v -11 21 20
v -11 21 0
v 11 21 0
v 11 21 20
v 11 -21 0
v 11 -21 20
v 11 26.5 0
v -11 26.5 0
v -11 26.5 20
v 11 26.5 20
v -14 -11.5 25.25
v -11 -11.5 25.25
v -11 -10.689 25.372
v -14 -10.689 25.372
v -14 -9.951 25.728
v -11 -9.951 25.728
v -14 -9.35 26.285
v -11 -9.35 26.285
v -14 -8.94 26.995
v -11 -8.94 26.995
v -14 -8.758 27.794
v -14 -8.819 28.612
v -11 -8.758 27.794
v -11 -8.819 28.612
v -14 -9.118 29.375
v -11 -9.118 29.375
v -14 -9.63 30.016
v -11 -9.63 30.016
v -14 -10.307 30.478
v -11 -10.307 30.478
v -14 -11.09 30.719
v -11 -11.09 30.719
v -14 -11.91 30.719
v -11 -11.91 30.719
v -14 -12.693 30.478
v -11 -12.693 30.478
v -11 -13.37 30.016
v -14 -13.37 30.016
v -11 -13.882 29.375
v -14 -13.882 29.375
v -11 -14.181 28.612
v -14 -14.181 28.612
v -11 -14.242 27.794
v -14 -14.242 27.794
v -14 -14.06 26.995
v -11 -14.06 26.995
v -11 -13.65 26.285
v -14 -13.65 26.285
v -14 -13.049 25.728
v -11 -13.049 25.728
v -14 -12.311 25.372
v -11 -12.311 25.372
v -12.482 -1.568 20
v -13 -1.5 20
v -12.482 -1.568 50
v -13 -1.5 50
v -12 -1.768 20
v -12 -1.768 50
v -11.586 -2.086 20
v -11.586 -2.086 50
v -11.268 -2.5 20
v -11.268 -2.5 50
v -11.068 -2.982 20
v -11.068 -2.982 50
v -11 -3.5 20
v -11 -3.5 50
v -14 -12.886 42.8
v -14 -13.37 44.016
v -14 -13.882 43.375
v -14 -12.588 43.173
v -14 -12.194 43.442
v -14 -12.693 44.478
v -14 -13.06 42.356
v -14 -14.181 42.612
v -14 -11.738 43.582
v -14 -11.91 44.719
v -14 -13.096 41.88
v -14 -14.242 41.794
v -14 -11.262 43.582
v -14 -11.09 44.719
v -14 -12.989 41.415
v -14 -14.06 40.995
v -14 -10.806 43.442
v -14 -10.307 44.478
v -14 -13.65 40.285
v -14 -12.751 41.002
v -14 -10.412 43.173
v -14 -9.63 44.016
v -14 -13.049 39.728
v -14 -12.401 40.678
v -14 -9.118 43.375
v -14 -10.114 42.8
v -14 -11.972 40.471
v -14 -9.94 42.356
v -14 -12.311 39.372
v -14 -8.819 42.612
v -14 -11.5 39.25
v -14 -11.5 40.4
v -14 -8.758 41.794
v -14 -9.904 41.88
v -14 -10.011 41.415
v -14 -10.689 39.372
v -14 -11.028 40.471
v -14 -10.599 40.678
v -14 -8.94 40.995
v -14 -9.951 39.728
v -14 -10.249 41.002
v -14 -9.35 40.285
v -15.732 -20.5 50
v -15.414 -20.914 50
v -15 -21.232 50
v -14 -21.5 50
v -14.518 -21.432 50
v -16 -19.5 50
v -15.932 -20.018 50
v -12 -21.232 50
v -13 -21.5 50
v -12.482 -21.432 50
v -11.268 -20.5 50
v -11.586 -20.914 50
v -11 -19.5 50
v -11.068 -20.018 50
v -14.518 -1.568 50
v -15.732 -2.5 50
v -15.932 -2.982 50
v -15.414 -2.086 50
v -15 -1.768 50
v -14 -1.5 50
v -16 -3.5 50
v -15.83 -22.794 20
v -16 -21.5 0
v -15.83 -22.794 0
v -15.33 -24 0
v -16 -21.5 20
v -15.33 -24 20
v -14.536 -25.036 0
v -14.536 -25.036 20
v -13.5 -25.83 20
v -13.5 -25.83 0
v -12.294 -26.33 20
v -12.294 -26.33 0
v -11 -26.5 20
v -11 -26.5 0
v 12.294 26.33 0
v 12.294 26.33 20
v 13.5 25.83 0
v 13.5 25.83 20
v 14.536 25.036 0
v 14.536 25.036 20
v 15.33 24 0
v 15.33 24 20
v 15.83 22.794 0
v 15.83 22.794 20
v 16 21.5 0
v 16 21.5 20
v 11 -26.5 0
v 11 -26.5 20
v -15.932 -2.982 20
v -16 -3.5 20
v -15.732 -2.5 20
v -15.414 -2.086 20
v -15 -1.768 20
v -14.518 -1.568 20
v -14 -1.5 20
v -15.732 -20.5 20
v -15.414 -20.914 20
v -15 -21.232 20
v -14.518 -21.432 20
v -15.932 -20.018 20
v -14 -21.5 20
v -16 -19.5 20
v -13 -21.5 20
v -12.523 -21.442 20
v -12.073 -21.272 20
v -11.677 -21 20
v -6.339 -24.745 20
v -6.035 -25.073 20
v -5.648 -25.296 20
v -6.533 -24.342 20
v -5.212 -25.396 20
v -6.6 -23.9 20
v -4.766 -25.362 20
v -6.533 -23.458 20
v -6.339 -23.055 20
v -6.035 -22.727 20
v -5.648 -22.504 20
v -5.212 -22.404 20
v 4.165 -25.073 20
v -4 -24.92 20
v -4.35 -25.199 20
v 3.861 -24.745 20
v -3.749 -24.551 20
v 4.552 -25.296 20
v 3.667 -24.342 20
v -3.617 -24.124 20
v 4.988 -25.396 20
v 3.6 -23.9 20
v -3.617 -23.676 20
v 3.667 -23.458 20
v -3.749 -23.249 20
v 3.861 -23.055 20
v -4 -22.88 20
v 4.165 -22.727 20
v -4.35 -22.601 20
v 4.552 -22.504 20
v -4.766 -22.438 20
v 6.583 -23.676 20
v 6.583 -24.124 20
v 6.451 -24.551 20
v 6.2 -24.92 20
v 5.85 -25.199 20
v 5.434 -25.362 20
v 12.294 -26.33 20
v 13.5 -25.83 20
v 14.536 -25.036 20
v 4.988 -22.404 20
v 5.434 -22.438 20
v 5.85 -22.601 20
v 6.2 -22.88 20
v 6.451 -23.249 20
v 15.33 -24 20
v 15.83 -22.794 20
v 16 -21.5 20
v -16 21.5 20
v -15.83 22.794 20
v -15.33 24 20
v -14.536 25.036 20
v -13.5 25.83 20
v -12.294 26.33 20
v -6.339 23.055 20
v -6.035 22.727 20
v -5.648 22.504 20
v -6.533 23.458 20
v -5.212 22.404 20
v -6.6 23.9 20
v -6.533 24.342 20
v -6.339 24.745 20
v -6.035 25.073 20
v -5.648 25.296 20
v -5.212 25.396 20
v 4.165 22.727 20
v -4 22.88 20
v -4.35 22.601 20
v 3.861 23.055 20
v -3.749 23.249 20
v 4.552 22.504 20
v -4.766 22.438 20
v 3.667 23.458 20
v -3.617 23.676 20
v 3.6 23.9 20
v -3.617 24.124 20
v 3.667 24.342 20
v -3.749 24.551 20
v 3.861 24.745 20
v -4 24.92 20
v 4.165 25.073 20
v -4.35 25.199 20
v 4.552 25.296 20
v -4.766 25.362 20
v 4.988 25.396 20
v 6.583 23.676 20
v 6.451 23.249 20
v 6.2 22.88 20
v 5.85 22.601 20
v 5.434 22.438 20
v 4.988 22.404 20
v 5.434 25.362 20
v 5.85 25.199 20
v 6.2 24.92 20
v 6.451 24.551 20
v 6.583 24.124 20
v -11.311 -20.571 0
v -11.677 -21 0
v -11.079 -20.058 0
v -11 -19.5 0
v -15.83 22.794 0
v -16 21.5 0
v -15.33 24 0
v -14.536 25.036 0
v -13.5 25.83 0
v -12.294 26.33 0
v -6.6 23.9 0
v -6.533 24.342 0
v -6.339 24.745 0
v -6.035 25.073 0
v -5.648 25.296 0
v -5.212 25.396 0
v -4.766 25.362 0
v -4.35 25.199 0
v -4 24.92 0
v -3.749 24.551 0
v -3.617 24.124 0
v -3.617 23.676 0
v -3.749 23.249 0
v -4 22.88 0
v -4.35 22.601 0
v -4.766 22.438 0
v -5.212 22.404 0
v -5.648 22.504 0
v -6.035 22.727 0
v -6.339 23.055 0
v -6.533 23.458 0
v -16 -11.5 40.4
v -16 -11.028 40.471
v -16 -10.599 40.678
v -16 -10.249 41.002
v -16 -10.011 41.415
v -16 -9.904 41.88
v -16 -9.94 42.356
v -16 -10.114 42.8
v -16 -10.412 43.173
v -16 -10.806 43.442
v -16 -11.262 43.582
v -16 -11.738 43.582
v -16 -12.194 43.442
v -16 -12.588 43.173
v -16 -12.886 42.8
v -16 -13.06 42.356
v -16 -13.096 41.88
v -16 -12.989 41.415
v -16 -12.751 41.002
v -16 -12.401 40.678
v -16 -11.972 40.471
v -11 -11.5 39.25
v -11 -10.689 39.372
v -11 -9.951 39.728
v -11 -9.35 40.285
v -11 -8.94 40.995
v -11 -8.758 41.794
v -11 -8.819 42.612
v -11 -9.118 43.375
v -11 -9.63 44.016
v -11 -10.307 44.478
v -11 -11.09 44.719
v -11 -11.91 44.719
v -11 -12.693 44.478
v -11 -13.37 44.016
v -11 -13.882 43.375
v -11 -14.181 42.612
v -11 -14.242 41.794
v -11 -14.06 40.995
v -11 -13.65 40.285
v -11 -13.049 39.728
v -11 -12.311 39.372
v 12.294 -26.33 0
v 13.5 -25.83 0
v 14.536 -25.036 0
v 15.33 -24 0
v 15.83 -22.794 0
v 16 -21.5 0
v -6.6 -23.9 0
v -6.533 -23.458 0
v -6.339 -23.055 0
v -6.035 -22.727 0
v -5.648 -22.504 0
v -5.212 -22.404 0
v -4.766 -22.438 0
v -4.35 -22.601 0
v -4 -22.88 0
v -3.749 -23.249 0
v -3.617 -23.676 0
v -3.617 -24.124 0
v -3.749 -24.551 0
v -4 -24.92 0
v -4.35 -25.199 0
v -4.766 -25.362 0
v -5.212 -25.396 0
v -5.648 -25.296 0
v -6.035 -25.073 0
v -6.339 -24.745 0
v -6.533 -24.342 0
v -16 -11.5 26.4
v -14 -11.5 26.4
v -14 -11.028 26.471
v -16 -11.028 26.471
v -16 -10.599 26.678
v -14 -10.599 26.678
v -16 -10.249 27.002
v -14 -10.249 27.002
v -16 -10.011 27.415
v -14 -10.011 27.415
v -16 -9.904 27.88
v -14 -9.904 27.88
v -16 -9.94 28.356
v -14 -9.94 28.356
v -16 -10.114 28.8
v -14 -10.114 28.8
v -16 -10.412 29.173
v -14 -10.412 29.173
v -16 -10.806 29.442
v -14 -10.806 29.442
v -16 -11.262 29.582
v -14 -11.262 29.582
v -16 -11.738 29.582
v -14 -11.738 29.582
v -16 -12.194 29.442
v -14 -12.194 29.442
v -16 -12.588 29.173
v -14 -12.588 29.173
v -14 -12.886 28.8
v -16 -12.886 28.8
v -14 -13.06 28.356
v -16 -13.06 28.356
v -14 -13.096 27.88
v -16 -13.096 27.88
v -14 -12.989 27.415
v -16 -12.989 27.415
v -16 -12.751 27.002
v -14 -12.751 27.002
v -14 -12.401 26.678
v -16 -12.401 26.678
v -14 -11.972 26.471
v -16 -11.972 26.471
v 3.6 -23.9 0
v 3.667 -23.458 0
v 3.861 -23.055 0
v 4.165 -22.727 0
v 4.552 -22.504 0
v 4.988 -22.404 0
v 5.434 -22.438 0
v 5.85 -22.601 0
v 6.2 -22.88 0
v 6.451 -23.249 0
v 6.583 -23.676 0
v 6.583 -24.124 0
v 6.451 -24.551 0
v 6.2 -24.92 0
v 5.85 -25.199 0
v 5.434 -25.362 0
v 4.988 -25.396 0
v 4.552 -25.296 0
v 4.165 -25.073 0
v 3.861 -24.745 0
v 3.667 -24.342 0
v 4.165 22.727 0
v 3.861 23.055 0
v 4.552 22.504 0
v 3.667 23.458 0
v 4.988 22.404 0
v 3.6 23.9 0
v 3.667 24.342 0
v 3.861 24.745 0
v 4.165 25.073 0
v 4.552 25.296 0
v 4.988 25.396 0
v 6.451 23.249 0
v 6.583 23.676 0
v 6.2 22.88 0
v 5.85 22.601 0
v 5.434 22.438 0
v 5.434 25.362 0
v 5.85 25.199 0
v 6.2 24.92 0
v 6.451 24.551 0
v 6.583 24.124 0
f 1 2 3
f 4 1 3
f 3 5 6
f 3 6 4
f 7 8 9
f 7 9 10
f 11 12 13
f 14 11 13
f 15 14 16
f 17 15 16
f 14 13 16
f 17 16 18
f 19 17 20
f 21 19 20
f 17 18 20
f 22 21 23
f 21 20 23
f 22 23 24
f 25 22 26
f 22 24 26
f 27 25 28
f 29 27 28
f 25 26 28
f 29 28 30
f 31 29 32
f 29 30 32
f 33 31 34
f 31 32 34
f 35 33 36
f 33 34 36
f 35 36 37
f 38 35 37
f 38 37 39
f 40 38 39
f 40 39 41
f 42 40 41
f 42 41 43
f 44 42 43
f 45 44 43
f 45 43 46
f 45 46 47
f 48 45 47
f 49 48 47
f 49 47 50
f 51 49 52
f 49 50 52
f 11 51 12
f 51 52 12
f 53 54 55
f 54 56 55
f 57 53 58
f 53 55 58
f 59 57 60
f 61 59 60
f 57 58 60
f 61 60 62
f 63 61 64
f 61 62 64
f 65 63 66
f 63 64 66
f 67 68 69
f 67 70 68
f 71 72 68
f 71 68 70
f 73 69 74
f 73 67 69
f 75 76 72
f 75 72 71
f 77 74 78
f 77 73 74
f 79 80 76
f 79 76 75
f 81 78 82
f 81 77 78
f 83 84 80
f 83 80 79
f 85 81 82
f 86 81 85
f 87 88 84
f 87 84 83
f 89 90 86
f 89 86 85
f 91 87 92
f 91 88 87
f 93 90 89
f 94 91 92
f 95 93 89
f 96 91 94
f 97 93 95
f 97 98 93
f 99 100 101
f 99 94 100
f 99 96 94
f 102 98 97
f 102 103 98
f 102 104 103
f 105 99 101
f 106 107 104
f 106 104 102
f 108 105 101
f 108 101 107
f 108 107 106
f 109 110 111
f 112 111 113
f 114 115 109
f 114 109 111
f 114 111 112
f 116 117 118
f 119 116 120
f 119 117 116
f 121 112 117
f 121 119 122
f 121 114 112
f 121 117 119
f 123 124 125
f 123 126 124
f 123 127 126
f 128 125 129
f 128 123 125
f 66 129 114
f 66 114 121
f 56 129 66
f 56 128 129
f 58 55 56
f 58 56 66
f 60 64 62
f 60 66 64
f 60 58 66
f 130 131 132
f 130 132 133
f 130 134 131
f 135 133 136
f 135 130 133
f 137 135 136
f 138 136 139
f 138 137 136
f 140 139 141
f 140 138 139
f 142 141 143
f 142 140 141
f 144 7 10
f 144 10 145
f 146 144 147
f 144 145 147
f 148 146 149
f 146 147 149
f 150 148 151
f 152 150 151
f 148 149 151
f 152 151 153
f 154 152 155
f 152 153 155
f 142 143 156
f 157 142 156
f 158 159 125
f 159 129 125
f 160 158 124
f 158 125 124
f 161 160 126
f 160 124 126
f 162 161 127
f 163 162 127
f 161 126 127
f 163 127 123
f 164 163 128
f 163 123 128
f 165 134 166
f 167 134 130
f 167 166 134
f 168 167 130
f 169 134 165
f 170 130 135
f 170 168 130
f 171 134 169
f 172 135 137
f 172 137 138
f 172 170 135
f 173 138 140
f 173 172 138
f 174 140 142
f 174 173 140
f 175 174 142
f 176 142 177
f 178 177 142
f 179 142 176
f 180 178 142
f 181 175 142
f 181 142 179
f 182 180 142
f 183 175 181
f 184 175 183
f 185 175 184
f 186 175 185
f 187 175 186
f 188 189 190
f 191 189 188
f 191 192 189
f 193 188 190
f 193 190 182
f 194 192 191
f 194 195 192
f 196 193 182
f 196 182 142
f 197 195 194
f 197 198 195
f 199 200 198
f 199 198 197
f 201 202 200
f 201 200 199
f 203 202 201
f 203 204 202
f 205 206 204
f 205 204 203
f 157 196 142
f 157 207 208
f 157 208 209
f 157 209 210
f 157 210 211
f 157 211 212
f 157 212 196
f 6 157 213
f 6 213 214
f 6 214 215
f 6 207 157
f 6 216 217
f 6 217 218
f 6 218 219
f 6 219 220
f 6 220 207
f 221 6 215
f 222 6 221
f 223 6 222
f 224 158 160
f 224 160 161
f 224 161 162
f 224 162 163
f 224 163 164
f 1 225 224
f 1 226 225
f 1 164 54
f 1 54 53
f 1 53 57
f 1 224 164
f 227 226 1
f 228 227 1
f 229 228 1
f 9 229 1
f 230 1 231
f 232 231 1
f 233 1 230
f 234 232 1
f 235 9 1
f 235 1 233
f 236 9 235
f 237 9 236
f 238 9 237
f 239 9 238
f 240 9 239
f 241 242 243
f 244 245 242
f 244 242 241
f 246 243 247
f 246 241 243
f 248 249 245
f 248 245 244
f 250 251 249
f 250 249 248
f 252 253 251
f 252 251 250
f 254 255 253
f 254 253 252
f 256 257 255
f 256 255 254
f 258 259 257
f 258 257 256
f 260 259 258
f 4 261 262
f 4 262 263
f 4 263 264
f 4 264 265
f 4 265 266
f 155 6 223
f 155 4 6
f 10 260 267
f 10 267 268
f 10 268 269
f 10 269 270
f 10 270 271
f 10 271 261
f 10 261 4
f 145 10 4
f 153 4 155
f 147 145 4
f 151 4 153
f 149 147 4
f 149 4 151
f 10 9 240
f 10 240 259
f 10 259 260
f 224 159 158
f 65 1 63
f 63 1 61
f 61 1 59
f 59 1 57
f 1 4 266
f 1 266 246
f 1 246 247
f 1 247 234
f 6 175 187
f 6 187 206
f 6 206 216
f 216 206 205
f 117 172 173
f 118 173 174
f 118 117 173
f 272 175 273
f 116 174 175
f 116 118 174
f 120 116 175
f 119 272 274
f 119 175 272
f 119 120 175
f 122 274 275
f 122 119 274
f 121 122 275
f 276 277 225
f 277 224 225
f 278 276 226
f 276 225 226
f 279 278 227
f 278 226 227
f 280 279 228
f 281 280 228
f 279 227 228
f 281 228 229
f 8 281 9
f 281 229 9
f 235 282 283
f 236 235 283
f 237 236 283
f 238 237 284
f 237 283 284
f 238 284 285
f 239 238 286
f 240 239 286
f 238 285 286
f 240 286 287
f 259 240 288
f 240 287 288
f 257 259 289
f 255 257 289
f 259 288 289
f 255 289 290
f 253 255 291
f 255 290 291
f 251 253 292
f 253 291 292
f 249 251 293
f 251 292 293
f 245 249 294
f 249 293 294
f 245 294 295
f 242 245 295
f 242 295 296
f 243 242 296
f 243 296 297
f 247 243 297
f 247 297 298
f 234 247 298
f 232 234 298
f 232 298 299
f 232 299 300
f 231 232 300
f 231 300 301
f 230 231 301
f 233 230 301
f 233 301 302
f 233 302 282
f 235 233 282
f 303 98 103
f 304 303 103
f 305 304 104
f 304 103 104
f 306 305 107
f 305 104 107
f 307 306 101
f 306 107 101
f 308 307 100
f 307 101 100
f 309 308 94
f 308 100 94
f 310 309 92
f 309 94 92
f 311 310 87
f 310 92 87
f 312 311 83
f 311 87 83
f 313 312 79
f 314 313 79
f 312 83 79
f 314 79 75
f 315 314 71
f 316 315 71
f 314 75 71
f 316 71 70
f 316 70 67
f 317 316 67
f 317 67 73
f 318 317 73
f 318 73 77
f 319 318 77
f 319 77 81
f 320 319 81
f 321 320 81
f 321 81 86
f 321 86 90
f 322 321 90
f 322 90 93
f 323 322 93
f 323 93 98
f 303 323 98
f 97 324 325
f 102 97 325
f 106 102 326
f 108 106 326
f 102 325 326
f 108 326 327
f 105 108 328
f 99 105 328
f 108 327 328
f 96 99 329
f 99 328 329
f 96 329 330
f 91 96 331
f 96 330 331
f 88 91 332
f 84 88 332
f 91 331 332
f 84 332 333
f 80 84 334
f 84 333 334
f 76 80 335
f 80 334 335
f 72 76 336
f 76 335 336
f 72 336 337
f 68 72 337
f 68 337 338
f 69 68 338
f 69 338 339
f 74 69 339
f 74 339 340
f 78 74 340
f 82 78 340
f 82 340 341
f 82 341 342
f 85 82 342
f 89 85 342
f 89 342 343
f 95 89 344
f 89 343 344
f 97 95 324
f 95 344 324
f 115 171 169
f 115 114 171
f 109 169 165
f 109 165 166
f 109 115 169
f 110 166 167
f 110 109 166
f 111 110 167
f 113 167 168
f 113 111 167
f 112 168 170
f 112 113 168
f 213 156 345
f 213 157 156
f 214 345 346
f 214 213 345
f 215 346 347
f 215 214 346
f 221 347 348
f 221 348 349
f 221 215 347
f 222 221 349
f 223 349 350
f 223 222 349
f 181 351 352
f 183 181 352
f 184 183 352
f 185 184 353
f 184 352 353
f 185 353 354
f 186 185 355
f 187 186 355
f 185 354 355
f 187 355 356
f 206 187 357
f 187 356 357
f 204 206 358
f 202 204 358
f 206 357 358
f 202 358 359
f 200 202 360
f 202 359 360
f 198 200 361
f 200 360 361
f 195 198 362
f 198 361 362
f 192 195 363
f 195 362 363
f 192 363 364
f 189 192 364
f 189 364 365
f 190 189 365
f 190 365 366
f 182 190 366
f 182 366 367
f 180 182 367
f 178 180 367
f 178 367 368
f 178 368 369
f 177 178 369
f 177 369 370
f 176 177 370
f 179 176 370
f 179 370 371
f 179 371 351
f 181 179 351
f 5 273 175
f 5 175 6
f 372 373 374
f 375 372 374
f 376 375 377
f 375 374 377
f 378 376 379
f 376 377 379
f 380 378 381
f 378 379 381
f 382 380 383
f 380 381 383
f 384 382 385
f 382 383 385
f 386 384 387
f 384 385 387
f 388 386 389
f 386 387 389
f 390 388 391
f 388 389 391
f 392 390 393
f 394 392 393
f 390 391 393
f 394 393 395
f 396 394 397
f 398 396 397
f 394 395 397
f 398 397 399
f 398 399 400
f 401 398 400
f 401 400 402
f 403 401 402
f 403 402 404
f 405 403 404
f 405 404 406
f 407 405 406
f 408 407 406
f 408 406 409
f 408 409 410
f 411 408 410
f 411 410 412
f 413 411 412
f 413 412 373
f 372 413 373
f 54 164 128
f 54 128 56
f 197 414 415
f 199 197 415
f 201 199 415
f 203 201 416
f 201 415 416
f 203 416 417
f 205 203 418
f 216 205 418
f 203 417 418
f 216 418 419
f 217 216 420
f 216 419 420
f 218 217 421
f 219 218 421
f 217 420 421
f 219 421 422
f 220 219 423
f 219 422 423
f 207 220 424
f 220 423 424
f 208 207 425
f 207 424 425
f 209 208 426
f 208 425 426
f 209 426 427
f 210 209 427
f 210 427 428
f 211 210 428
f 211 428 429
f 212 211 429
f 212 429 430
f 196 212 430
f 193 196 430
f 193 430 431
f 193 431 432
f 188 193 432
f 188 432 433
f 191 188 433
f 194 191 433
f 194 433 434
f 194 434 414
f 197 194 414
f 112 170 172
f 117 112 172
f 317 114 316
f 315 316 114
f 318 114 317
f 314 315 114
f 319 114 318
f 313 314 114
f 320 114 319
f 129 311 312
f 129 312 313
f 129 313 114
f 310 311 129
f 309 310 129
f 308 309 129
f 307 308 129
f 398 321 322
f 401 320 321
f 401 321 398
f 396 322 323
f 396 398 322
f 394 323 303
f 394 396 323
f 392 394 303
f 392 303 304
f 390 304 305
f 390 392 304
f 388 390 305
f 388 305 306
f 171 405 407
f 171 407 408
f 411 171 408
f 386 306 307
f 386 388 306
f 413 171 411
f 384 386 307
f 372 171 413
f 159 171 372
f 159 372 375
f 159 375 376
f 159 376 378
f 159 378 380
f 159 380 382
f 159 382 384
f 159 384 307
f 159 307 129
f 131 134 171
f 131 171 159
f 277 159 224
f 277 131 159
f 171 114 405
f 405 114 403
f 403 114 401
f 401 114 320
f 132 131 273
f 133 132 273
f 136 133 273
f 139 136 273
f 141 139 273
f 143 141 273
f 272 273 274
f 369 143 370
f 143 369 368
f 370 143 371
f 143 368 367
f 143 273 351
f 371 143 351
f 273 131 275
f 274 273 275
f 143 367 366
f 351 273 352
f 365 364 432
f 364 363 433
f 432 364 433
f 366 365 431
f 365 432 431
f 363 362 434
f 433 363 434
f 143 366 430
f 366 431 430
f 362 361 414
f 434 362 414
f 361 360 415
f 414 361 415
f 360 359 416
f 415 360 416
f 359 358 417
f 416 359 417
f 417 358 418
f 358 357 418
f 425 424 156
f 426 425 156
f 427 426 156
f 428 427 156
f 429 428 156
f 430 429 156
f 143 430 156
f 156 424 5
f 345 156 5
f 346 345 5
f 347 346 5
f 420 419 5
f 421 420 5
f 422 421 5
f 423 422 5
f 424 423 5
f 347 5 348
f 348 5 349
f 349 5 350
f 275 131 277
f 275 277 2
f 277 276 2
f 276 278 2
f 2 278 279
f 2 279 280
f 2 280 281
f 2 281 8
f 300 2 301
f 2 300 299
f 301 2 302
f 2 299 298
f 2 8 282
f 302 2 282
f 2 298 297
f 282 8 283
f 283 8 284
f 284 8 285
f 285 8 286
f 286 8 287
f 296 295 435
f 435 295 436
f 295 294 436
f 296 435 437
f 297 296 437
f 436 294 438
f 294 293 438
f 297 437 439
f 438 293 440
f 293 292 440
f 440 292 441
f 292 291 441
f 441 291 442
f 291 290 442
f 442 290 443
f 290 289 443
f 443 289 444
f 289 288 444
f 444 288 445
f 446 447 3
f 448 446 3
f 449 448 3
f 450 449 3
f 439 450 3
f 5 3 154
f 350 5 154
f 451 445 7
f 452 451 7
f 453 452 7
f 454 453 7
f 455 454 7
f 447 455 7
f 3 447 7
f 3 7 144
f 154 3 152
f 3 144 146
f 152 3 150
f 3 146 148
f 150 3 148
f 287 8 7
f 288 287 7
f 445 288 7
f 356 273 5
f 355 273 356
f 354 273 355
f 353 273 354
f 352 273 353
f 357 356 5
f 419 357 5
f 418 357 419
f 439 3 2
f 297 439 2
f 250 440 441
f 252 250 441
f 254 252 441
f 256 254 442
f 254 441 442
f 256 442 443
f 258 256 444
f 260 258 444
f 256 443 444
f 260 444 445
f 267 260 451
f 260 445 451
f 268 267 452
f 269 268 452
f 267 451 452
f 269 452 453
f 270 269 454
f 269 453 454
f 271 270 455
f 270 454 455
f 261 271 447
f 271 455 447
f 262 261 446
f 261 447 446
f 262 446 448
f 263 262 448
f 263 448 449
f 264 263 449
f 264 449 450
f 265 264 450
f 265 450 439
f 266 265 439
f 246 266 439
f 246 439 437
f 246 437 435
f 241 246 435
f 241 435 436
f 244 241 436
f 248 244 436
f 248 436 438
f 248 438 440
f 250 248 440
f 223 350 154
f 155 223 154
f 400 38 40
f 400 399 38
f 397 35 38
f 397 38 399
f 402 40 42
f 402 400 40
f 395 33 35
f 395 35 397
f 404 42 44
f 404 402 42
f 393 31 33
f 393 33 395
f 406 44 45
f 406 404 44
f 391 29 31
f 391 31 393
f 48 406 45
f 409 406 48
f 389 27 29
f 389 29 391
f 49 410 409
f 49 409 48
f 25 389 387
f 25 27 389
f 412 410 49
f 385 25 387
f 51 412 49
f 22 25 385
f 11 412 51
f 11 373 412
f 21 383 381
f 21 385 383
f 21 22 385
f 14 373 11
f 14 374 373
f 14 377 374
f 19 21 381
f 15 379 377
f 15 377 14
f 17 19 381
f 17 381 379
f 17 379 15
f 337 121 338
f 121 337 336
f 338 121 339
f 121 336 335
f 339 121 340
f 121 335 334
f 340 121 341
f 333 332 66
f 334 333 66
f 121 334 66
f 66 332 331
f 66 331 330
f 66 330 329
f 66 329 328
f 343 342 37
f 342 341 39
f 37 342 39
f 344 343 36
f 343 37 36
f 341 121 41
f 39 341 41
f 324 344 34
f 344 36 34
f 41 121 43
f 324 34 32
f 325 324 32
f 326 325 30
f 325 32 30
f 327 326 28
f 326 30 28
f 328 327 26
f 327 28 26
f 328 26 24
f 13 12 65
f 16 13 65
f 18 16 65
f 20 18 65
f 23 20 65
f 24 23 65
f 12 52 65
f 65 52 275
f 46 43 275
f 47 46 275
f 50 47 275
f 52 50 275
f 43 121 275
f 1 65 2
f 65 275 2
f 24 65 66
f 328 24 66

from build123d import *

# Parameters (mm, degrees)
SKETCH1_W           = 32
SKETCH1_H           = 53
SKETCH1_W_2         = 22
SKETCH1_H_2         = 42
BOSS_EXTRUDE1_DEPTH = 20
SKETCH2_W           = 5
SKETCH2_H           = 20
BOSS_EXTRUDE2_DEPTH = 30
SKETCH3_R           = 2.75
SKETCH3_R_2         = 1.6
CUT_EXTRUDE1_DEPTH  = 3
SKETCH3_2_R         = 1.6
CUT_EXTRUDE2_DEPTH  = 63.69968102
SKETCH4_R           = 1.5
CUT_EXTRUDE3_DEPTH  = 59.806887352
FILLET1_R           = 5
FILLET2_R           = 2


with BuildPart() as part:
    # Sketch1 → Boss-Extrude1 (new body)
    with BuildSketch(Plane.XY):
        Rectangle(SKETCH1_W, SKETCH1_H)
        Rectangle(SKETCH1_W_2, SKETCH1_H_2, mode=Mode.SUBTRACT)
    extrude(amount=BOSS_EXTRUDE1_DEPTH)

    # Sketch2 → Boss-Extrude2 (add)
    with BuildSketch(Plane.XY.offset(20)):
        with Locations((-13.5, -11.5)):
            Rectangle(SKETCH2_W, SKETCH2_H)
    extrude(amount=BOSS_EXTRUDE2_DEPTH)

    # Sketch3 → Cut-Extrude1 (cut)
    # profile 1 of 2: a face of its own
    with BuildSketch(Plane(origin=(-11, 0, 0), x_dir=(0, 0, -1), z_dir=(1, 0, 0))):
        with Locations((-42, -11.5)):
            Circle(SKETCH3_R)
        with Locations((-42, -11.5)):
            Circle(SKETCH3_R_2, mode=Mode.SUBTRACT)
    # profile 2 of 2: a face of its own
    with BuildSketch(Plane(origin=(-11, 0, 0), x_dir=(0, 0, -1), z_dir=(1, 0, 0))):
        with Locations((-28, -11.5)):
            Circle(SKETCH3_R)
        with Locations((-28, -11.5)):
            Circle(SKETCH3_R_2, mode=Mode.SUBTRACT)
    extrude(amount=-CUT_EXTRUDE1_DEPTH, mode=Mode.SUBTRACT)

    # Sketch3<2> → Cut-Extrude2 (cut, through all)
    with BuildSketch(Plane(origin=(-11, 0, 0), x_dir=(0, 0, -1), z_dir=(1, 0, 0))):
        with Locations((-42, -11.5)):
            Circle(SKETCH3_2_R)
        with Locations((-28, -11.5)):
            Circle(SKETCH3_2_R)
    extrude(amount=-CUT_EXTRUDE2_DEPTH, mode=Mode.SUBTRACT)

    # Sketch4 → Cut-Extrude3 (cut, through all)
    with BuildSketch(Plane(origin=(0, 0, 0), x_dir=(-1, 0, 0), z_dir=(0, 0, -1))):
        with Locations((-5.1, -23.9)):
            Circle(SKETCH4_R)
        with Locations((5.1, -23.9)):
            Circle(SKETCH4_R)
        with Locations((-5.1, 23.9)):
            Circle(SKETCH4_R)
        with Locations((5.1, 23.9)):
            Circle(SKETCH4_R)
    extrude(amount=-CUT_EXTRUDE3_DEPTH, mode=Mode.SUBTRACT)

    # Fillet1
    fillet1_edges = [part.edges().sort_by_distance(p)[0] for p in [
        (16, -26.5, 10),
        (-16, -26.5, 10),
        (-16, 26.5, 10),
        (16, 26.5, 10),
    ]]
    fillet(fillet1_edges, radius=FILLET1_R)

    # Fillet2
    fillet2_edges = [part.edges().sort_by_distance(p)[0] for p in [
        (-16, -1.5, 35),
        (-16, -21.5, 35),
        (-11, -1.5, 35),
        (-11, -21.5, 35),
    ]]
    fillet(fillet2_edges, radius=FILLET2_R)


solid = part.part
